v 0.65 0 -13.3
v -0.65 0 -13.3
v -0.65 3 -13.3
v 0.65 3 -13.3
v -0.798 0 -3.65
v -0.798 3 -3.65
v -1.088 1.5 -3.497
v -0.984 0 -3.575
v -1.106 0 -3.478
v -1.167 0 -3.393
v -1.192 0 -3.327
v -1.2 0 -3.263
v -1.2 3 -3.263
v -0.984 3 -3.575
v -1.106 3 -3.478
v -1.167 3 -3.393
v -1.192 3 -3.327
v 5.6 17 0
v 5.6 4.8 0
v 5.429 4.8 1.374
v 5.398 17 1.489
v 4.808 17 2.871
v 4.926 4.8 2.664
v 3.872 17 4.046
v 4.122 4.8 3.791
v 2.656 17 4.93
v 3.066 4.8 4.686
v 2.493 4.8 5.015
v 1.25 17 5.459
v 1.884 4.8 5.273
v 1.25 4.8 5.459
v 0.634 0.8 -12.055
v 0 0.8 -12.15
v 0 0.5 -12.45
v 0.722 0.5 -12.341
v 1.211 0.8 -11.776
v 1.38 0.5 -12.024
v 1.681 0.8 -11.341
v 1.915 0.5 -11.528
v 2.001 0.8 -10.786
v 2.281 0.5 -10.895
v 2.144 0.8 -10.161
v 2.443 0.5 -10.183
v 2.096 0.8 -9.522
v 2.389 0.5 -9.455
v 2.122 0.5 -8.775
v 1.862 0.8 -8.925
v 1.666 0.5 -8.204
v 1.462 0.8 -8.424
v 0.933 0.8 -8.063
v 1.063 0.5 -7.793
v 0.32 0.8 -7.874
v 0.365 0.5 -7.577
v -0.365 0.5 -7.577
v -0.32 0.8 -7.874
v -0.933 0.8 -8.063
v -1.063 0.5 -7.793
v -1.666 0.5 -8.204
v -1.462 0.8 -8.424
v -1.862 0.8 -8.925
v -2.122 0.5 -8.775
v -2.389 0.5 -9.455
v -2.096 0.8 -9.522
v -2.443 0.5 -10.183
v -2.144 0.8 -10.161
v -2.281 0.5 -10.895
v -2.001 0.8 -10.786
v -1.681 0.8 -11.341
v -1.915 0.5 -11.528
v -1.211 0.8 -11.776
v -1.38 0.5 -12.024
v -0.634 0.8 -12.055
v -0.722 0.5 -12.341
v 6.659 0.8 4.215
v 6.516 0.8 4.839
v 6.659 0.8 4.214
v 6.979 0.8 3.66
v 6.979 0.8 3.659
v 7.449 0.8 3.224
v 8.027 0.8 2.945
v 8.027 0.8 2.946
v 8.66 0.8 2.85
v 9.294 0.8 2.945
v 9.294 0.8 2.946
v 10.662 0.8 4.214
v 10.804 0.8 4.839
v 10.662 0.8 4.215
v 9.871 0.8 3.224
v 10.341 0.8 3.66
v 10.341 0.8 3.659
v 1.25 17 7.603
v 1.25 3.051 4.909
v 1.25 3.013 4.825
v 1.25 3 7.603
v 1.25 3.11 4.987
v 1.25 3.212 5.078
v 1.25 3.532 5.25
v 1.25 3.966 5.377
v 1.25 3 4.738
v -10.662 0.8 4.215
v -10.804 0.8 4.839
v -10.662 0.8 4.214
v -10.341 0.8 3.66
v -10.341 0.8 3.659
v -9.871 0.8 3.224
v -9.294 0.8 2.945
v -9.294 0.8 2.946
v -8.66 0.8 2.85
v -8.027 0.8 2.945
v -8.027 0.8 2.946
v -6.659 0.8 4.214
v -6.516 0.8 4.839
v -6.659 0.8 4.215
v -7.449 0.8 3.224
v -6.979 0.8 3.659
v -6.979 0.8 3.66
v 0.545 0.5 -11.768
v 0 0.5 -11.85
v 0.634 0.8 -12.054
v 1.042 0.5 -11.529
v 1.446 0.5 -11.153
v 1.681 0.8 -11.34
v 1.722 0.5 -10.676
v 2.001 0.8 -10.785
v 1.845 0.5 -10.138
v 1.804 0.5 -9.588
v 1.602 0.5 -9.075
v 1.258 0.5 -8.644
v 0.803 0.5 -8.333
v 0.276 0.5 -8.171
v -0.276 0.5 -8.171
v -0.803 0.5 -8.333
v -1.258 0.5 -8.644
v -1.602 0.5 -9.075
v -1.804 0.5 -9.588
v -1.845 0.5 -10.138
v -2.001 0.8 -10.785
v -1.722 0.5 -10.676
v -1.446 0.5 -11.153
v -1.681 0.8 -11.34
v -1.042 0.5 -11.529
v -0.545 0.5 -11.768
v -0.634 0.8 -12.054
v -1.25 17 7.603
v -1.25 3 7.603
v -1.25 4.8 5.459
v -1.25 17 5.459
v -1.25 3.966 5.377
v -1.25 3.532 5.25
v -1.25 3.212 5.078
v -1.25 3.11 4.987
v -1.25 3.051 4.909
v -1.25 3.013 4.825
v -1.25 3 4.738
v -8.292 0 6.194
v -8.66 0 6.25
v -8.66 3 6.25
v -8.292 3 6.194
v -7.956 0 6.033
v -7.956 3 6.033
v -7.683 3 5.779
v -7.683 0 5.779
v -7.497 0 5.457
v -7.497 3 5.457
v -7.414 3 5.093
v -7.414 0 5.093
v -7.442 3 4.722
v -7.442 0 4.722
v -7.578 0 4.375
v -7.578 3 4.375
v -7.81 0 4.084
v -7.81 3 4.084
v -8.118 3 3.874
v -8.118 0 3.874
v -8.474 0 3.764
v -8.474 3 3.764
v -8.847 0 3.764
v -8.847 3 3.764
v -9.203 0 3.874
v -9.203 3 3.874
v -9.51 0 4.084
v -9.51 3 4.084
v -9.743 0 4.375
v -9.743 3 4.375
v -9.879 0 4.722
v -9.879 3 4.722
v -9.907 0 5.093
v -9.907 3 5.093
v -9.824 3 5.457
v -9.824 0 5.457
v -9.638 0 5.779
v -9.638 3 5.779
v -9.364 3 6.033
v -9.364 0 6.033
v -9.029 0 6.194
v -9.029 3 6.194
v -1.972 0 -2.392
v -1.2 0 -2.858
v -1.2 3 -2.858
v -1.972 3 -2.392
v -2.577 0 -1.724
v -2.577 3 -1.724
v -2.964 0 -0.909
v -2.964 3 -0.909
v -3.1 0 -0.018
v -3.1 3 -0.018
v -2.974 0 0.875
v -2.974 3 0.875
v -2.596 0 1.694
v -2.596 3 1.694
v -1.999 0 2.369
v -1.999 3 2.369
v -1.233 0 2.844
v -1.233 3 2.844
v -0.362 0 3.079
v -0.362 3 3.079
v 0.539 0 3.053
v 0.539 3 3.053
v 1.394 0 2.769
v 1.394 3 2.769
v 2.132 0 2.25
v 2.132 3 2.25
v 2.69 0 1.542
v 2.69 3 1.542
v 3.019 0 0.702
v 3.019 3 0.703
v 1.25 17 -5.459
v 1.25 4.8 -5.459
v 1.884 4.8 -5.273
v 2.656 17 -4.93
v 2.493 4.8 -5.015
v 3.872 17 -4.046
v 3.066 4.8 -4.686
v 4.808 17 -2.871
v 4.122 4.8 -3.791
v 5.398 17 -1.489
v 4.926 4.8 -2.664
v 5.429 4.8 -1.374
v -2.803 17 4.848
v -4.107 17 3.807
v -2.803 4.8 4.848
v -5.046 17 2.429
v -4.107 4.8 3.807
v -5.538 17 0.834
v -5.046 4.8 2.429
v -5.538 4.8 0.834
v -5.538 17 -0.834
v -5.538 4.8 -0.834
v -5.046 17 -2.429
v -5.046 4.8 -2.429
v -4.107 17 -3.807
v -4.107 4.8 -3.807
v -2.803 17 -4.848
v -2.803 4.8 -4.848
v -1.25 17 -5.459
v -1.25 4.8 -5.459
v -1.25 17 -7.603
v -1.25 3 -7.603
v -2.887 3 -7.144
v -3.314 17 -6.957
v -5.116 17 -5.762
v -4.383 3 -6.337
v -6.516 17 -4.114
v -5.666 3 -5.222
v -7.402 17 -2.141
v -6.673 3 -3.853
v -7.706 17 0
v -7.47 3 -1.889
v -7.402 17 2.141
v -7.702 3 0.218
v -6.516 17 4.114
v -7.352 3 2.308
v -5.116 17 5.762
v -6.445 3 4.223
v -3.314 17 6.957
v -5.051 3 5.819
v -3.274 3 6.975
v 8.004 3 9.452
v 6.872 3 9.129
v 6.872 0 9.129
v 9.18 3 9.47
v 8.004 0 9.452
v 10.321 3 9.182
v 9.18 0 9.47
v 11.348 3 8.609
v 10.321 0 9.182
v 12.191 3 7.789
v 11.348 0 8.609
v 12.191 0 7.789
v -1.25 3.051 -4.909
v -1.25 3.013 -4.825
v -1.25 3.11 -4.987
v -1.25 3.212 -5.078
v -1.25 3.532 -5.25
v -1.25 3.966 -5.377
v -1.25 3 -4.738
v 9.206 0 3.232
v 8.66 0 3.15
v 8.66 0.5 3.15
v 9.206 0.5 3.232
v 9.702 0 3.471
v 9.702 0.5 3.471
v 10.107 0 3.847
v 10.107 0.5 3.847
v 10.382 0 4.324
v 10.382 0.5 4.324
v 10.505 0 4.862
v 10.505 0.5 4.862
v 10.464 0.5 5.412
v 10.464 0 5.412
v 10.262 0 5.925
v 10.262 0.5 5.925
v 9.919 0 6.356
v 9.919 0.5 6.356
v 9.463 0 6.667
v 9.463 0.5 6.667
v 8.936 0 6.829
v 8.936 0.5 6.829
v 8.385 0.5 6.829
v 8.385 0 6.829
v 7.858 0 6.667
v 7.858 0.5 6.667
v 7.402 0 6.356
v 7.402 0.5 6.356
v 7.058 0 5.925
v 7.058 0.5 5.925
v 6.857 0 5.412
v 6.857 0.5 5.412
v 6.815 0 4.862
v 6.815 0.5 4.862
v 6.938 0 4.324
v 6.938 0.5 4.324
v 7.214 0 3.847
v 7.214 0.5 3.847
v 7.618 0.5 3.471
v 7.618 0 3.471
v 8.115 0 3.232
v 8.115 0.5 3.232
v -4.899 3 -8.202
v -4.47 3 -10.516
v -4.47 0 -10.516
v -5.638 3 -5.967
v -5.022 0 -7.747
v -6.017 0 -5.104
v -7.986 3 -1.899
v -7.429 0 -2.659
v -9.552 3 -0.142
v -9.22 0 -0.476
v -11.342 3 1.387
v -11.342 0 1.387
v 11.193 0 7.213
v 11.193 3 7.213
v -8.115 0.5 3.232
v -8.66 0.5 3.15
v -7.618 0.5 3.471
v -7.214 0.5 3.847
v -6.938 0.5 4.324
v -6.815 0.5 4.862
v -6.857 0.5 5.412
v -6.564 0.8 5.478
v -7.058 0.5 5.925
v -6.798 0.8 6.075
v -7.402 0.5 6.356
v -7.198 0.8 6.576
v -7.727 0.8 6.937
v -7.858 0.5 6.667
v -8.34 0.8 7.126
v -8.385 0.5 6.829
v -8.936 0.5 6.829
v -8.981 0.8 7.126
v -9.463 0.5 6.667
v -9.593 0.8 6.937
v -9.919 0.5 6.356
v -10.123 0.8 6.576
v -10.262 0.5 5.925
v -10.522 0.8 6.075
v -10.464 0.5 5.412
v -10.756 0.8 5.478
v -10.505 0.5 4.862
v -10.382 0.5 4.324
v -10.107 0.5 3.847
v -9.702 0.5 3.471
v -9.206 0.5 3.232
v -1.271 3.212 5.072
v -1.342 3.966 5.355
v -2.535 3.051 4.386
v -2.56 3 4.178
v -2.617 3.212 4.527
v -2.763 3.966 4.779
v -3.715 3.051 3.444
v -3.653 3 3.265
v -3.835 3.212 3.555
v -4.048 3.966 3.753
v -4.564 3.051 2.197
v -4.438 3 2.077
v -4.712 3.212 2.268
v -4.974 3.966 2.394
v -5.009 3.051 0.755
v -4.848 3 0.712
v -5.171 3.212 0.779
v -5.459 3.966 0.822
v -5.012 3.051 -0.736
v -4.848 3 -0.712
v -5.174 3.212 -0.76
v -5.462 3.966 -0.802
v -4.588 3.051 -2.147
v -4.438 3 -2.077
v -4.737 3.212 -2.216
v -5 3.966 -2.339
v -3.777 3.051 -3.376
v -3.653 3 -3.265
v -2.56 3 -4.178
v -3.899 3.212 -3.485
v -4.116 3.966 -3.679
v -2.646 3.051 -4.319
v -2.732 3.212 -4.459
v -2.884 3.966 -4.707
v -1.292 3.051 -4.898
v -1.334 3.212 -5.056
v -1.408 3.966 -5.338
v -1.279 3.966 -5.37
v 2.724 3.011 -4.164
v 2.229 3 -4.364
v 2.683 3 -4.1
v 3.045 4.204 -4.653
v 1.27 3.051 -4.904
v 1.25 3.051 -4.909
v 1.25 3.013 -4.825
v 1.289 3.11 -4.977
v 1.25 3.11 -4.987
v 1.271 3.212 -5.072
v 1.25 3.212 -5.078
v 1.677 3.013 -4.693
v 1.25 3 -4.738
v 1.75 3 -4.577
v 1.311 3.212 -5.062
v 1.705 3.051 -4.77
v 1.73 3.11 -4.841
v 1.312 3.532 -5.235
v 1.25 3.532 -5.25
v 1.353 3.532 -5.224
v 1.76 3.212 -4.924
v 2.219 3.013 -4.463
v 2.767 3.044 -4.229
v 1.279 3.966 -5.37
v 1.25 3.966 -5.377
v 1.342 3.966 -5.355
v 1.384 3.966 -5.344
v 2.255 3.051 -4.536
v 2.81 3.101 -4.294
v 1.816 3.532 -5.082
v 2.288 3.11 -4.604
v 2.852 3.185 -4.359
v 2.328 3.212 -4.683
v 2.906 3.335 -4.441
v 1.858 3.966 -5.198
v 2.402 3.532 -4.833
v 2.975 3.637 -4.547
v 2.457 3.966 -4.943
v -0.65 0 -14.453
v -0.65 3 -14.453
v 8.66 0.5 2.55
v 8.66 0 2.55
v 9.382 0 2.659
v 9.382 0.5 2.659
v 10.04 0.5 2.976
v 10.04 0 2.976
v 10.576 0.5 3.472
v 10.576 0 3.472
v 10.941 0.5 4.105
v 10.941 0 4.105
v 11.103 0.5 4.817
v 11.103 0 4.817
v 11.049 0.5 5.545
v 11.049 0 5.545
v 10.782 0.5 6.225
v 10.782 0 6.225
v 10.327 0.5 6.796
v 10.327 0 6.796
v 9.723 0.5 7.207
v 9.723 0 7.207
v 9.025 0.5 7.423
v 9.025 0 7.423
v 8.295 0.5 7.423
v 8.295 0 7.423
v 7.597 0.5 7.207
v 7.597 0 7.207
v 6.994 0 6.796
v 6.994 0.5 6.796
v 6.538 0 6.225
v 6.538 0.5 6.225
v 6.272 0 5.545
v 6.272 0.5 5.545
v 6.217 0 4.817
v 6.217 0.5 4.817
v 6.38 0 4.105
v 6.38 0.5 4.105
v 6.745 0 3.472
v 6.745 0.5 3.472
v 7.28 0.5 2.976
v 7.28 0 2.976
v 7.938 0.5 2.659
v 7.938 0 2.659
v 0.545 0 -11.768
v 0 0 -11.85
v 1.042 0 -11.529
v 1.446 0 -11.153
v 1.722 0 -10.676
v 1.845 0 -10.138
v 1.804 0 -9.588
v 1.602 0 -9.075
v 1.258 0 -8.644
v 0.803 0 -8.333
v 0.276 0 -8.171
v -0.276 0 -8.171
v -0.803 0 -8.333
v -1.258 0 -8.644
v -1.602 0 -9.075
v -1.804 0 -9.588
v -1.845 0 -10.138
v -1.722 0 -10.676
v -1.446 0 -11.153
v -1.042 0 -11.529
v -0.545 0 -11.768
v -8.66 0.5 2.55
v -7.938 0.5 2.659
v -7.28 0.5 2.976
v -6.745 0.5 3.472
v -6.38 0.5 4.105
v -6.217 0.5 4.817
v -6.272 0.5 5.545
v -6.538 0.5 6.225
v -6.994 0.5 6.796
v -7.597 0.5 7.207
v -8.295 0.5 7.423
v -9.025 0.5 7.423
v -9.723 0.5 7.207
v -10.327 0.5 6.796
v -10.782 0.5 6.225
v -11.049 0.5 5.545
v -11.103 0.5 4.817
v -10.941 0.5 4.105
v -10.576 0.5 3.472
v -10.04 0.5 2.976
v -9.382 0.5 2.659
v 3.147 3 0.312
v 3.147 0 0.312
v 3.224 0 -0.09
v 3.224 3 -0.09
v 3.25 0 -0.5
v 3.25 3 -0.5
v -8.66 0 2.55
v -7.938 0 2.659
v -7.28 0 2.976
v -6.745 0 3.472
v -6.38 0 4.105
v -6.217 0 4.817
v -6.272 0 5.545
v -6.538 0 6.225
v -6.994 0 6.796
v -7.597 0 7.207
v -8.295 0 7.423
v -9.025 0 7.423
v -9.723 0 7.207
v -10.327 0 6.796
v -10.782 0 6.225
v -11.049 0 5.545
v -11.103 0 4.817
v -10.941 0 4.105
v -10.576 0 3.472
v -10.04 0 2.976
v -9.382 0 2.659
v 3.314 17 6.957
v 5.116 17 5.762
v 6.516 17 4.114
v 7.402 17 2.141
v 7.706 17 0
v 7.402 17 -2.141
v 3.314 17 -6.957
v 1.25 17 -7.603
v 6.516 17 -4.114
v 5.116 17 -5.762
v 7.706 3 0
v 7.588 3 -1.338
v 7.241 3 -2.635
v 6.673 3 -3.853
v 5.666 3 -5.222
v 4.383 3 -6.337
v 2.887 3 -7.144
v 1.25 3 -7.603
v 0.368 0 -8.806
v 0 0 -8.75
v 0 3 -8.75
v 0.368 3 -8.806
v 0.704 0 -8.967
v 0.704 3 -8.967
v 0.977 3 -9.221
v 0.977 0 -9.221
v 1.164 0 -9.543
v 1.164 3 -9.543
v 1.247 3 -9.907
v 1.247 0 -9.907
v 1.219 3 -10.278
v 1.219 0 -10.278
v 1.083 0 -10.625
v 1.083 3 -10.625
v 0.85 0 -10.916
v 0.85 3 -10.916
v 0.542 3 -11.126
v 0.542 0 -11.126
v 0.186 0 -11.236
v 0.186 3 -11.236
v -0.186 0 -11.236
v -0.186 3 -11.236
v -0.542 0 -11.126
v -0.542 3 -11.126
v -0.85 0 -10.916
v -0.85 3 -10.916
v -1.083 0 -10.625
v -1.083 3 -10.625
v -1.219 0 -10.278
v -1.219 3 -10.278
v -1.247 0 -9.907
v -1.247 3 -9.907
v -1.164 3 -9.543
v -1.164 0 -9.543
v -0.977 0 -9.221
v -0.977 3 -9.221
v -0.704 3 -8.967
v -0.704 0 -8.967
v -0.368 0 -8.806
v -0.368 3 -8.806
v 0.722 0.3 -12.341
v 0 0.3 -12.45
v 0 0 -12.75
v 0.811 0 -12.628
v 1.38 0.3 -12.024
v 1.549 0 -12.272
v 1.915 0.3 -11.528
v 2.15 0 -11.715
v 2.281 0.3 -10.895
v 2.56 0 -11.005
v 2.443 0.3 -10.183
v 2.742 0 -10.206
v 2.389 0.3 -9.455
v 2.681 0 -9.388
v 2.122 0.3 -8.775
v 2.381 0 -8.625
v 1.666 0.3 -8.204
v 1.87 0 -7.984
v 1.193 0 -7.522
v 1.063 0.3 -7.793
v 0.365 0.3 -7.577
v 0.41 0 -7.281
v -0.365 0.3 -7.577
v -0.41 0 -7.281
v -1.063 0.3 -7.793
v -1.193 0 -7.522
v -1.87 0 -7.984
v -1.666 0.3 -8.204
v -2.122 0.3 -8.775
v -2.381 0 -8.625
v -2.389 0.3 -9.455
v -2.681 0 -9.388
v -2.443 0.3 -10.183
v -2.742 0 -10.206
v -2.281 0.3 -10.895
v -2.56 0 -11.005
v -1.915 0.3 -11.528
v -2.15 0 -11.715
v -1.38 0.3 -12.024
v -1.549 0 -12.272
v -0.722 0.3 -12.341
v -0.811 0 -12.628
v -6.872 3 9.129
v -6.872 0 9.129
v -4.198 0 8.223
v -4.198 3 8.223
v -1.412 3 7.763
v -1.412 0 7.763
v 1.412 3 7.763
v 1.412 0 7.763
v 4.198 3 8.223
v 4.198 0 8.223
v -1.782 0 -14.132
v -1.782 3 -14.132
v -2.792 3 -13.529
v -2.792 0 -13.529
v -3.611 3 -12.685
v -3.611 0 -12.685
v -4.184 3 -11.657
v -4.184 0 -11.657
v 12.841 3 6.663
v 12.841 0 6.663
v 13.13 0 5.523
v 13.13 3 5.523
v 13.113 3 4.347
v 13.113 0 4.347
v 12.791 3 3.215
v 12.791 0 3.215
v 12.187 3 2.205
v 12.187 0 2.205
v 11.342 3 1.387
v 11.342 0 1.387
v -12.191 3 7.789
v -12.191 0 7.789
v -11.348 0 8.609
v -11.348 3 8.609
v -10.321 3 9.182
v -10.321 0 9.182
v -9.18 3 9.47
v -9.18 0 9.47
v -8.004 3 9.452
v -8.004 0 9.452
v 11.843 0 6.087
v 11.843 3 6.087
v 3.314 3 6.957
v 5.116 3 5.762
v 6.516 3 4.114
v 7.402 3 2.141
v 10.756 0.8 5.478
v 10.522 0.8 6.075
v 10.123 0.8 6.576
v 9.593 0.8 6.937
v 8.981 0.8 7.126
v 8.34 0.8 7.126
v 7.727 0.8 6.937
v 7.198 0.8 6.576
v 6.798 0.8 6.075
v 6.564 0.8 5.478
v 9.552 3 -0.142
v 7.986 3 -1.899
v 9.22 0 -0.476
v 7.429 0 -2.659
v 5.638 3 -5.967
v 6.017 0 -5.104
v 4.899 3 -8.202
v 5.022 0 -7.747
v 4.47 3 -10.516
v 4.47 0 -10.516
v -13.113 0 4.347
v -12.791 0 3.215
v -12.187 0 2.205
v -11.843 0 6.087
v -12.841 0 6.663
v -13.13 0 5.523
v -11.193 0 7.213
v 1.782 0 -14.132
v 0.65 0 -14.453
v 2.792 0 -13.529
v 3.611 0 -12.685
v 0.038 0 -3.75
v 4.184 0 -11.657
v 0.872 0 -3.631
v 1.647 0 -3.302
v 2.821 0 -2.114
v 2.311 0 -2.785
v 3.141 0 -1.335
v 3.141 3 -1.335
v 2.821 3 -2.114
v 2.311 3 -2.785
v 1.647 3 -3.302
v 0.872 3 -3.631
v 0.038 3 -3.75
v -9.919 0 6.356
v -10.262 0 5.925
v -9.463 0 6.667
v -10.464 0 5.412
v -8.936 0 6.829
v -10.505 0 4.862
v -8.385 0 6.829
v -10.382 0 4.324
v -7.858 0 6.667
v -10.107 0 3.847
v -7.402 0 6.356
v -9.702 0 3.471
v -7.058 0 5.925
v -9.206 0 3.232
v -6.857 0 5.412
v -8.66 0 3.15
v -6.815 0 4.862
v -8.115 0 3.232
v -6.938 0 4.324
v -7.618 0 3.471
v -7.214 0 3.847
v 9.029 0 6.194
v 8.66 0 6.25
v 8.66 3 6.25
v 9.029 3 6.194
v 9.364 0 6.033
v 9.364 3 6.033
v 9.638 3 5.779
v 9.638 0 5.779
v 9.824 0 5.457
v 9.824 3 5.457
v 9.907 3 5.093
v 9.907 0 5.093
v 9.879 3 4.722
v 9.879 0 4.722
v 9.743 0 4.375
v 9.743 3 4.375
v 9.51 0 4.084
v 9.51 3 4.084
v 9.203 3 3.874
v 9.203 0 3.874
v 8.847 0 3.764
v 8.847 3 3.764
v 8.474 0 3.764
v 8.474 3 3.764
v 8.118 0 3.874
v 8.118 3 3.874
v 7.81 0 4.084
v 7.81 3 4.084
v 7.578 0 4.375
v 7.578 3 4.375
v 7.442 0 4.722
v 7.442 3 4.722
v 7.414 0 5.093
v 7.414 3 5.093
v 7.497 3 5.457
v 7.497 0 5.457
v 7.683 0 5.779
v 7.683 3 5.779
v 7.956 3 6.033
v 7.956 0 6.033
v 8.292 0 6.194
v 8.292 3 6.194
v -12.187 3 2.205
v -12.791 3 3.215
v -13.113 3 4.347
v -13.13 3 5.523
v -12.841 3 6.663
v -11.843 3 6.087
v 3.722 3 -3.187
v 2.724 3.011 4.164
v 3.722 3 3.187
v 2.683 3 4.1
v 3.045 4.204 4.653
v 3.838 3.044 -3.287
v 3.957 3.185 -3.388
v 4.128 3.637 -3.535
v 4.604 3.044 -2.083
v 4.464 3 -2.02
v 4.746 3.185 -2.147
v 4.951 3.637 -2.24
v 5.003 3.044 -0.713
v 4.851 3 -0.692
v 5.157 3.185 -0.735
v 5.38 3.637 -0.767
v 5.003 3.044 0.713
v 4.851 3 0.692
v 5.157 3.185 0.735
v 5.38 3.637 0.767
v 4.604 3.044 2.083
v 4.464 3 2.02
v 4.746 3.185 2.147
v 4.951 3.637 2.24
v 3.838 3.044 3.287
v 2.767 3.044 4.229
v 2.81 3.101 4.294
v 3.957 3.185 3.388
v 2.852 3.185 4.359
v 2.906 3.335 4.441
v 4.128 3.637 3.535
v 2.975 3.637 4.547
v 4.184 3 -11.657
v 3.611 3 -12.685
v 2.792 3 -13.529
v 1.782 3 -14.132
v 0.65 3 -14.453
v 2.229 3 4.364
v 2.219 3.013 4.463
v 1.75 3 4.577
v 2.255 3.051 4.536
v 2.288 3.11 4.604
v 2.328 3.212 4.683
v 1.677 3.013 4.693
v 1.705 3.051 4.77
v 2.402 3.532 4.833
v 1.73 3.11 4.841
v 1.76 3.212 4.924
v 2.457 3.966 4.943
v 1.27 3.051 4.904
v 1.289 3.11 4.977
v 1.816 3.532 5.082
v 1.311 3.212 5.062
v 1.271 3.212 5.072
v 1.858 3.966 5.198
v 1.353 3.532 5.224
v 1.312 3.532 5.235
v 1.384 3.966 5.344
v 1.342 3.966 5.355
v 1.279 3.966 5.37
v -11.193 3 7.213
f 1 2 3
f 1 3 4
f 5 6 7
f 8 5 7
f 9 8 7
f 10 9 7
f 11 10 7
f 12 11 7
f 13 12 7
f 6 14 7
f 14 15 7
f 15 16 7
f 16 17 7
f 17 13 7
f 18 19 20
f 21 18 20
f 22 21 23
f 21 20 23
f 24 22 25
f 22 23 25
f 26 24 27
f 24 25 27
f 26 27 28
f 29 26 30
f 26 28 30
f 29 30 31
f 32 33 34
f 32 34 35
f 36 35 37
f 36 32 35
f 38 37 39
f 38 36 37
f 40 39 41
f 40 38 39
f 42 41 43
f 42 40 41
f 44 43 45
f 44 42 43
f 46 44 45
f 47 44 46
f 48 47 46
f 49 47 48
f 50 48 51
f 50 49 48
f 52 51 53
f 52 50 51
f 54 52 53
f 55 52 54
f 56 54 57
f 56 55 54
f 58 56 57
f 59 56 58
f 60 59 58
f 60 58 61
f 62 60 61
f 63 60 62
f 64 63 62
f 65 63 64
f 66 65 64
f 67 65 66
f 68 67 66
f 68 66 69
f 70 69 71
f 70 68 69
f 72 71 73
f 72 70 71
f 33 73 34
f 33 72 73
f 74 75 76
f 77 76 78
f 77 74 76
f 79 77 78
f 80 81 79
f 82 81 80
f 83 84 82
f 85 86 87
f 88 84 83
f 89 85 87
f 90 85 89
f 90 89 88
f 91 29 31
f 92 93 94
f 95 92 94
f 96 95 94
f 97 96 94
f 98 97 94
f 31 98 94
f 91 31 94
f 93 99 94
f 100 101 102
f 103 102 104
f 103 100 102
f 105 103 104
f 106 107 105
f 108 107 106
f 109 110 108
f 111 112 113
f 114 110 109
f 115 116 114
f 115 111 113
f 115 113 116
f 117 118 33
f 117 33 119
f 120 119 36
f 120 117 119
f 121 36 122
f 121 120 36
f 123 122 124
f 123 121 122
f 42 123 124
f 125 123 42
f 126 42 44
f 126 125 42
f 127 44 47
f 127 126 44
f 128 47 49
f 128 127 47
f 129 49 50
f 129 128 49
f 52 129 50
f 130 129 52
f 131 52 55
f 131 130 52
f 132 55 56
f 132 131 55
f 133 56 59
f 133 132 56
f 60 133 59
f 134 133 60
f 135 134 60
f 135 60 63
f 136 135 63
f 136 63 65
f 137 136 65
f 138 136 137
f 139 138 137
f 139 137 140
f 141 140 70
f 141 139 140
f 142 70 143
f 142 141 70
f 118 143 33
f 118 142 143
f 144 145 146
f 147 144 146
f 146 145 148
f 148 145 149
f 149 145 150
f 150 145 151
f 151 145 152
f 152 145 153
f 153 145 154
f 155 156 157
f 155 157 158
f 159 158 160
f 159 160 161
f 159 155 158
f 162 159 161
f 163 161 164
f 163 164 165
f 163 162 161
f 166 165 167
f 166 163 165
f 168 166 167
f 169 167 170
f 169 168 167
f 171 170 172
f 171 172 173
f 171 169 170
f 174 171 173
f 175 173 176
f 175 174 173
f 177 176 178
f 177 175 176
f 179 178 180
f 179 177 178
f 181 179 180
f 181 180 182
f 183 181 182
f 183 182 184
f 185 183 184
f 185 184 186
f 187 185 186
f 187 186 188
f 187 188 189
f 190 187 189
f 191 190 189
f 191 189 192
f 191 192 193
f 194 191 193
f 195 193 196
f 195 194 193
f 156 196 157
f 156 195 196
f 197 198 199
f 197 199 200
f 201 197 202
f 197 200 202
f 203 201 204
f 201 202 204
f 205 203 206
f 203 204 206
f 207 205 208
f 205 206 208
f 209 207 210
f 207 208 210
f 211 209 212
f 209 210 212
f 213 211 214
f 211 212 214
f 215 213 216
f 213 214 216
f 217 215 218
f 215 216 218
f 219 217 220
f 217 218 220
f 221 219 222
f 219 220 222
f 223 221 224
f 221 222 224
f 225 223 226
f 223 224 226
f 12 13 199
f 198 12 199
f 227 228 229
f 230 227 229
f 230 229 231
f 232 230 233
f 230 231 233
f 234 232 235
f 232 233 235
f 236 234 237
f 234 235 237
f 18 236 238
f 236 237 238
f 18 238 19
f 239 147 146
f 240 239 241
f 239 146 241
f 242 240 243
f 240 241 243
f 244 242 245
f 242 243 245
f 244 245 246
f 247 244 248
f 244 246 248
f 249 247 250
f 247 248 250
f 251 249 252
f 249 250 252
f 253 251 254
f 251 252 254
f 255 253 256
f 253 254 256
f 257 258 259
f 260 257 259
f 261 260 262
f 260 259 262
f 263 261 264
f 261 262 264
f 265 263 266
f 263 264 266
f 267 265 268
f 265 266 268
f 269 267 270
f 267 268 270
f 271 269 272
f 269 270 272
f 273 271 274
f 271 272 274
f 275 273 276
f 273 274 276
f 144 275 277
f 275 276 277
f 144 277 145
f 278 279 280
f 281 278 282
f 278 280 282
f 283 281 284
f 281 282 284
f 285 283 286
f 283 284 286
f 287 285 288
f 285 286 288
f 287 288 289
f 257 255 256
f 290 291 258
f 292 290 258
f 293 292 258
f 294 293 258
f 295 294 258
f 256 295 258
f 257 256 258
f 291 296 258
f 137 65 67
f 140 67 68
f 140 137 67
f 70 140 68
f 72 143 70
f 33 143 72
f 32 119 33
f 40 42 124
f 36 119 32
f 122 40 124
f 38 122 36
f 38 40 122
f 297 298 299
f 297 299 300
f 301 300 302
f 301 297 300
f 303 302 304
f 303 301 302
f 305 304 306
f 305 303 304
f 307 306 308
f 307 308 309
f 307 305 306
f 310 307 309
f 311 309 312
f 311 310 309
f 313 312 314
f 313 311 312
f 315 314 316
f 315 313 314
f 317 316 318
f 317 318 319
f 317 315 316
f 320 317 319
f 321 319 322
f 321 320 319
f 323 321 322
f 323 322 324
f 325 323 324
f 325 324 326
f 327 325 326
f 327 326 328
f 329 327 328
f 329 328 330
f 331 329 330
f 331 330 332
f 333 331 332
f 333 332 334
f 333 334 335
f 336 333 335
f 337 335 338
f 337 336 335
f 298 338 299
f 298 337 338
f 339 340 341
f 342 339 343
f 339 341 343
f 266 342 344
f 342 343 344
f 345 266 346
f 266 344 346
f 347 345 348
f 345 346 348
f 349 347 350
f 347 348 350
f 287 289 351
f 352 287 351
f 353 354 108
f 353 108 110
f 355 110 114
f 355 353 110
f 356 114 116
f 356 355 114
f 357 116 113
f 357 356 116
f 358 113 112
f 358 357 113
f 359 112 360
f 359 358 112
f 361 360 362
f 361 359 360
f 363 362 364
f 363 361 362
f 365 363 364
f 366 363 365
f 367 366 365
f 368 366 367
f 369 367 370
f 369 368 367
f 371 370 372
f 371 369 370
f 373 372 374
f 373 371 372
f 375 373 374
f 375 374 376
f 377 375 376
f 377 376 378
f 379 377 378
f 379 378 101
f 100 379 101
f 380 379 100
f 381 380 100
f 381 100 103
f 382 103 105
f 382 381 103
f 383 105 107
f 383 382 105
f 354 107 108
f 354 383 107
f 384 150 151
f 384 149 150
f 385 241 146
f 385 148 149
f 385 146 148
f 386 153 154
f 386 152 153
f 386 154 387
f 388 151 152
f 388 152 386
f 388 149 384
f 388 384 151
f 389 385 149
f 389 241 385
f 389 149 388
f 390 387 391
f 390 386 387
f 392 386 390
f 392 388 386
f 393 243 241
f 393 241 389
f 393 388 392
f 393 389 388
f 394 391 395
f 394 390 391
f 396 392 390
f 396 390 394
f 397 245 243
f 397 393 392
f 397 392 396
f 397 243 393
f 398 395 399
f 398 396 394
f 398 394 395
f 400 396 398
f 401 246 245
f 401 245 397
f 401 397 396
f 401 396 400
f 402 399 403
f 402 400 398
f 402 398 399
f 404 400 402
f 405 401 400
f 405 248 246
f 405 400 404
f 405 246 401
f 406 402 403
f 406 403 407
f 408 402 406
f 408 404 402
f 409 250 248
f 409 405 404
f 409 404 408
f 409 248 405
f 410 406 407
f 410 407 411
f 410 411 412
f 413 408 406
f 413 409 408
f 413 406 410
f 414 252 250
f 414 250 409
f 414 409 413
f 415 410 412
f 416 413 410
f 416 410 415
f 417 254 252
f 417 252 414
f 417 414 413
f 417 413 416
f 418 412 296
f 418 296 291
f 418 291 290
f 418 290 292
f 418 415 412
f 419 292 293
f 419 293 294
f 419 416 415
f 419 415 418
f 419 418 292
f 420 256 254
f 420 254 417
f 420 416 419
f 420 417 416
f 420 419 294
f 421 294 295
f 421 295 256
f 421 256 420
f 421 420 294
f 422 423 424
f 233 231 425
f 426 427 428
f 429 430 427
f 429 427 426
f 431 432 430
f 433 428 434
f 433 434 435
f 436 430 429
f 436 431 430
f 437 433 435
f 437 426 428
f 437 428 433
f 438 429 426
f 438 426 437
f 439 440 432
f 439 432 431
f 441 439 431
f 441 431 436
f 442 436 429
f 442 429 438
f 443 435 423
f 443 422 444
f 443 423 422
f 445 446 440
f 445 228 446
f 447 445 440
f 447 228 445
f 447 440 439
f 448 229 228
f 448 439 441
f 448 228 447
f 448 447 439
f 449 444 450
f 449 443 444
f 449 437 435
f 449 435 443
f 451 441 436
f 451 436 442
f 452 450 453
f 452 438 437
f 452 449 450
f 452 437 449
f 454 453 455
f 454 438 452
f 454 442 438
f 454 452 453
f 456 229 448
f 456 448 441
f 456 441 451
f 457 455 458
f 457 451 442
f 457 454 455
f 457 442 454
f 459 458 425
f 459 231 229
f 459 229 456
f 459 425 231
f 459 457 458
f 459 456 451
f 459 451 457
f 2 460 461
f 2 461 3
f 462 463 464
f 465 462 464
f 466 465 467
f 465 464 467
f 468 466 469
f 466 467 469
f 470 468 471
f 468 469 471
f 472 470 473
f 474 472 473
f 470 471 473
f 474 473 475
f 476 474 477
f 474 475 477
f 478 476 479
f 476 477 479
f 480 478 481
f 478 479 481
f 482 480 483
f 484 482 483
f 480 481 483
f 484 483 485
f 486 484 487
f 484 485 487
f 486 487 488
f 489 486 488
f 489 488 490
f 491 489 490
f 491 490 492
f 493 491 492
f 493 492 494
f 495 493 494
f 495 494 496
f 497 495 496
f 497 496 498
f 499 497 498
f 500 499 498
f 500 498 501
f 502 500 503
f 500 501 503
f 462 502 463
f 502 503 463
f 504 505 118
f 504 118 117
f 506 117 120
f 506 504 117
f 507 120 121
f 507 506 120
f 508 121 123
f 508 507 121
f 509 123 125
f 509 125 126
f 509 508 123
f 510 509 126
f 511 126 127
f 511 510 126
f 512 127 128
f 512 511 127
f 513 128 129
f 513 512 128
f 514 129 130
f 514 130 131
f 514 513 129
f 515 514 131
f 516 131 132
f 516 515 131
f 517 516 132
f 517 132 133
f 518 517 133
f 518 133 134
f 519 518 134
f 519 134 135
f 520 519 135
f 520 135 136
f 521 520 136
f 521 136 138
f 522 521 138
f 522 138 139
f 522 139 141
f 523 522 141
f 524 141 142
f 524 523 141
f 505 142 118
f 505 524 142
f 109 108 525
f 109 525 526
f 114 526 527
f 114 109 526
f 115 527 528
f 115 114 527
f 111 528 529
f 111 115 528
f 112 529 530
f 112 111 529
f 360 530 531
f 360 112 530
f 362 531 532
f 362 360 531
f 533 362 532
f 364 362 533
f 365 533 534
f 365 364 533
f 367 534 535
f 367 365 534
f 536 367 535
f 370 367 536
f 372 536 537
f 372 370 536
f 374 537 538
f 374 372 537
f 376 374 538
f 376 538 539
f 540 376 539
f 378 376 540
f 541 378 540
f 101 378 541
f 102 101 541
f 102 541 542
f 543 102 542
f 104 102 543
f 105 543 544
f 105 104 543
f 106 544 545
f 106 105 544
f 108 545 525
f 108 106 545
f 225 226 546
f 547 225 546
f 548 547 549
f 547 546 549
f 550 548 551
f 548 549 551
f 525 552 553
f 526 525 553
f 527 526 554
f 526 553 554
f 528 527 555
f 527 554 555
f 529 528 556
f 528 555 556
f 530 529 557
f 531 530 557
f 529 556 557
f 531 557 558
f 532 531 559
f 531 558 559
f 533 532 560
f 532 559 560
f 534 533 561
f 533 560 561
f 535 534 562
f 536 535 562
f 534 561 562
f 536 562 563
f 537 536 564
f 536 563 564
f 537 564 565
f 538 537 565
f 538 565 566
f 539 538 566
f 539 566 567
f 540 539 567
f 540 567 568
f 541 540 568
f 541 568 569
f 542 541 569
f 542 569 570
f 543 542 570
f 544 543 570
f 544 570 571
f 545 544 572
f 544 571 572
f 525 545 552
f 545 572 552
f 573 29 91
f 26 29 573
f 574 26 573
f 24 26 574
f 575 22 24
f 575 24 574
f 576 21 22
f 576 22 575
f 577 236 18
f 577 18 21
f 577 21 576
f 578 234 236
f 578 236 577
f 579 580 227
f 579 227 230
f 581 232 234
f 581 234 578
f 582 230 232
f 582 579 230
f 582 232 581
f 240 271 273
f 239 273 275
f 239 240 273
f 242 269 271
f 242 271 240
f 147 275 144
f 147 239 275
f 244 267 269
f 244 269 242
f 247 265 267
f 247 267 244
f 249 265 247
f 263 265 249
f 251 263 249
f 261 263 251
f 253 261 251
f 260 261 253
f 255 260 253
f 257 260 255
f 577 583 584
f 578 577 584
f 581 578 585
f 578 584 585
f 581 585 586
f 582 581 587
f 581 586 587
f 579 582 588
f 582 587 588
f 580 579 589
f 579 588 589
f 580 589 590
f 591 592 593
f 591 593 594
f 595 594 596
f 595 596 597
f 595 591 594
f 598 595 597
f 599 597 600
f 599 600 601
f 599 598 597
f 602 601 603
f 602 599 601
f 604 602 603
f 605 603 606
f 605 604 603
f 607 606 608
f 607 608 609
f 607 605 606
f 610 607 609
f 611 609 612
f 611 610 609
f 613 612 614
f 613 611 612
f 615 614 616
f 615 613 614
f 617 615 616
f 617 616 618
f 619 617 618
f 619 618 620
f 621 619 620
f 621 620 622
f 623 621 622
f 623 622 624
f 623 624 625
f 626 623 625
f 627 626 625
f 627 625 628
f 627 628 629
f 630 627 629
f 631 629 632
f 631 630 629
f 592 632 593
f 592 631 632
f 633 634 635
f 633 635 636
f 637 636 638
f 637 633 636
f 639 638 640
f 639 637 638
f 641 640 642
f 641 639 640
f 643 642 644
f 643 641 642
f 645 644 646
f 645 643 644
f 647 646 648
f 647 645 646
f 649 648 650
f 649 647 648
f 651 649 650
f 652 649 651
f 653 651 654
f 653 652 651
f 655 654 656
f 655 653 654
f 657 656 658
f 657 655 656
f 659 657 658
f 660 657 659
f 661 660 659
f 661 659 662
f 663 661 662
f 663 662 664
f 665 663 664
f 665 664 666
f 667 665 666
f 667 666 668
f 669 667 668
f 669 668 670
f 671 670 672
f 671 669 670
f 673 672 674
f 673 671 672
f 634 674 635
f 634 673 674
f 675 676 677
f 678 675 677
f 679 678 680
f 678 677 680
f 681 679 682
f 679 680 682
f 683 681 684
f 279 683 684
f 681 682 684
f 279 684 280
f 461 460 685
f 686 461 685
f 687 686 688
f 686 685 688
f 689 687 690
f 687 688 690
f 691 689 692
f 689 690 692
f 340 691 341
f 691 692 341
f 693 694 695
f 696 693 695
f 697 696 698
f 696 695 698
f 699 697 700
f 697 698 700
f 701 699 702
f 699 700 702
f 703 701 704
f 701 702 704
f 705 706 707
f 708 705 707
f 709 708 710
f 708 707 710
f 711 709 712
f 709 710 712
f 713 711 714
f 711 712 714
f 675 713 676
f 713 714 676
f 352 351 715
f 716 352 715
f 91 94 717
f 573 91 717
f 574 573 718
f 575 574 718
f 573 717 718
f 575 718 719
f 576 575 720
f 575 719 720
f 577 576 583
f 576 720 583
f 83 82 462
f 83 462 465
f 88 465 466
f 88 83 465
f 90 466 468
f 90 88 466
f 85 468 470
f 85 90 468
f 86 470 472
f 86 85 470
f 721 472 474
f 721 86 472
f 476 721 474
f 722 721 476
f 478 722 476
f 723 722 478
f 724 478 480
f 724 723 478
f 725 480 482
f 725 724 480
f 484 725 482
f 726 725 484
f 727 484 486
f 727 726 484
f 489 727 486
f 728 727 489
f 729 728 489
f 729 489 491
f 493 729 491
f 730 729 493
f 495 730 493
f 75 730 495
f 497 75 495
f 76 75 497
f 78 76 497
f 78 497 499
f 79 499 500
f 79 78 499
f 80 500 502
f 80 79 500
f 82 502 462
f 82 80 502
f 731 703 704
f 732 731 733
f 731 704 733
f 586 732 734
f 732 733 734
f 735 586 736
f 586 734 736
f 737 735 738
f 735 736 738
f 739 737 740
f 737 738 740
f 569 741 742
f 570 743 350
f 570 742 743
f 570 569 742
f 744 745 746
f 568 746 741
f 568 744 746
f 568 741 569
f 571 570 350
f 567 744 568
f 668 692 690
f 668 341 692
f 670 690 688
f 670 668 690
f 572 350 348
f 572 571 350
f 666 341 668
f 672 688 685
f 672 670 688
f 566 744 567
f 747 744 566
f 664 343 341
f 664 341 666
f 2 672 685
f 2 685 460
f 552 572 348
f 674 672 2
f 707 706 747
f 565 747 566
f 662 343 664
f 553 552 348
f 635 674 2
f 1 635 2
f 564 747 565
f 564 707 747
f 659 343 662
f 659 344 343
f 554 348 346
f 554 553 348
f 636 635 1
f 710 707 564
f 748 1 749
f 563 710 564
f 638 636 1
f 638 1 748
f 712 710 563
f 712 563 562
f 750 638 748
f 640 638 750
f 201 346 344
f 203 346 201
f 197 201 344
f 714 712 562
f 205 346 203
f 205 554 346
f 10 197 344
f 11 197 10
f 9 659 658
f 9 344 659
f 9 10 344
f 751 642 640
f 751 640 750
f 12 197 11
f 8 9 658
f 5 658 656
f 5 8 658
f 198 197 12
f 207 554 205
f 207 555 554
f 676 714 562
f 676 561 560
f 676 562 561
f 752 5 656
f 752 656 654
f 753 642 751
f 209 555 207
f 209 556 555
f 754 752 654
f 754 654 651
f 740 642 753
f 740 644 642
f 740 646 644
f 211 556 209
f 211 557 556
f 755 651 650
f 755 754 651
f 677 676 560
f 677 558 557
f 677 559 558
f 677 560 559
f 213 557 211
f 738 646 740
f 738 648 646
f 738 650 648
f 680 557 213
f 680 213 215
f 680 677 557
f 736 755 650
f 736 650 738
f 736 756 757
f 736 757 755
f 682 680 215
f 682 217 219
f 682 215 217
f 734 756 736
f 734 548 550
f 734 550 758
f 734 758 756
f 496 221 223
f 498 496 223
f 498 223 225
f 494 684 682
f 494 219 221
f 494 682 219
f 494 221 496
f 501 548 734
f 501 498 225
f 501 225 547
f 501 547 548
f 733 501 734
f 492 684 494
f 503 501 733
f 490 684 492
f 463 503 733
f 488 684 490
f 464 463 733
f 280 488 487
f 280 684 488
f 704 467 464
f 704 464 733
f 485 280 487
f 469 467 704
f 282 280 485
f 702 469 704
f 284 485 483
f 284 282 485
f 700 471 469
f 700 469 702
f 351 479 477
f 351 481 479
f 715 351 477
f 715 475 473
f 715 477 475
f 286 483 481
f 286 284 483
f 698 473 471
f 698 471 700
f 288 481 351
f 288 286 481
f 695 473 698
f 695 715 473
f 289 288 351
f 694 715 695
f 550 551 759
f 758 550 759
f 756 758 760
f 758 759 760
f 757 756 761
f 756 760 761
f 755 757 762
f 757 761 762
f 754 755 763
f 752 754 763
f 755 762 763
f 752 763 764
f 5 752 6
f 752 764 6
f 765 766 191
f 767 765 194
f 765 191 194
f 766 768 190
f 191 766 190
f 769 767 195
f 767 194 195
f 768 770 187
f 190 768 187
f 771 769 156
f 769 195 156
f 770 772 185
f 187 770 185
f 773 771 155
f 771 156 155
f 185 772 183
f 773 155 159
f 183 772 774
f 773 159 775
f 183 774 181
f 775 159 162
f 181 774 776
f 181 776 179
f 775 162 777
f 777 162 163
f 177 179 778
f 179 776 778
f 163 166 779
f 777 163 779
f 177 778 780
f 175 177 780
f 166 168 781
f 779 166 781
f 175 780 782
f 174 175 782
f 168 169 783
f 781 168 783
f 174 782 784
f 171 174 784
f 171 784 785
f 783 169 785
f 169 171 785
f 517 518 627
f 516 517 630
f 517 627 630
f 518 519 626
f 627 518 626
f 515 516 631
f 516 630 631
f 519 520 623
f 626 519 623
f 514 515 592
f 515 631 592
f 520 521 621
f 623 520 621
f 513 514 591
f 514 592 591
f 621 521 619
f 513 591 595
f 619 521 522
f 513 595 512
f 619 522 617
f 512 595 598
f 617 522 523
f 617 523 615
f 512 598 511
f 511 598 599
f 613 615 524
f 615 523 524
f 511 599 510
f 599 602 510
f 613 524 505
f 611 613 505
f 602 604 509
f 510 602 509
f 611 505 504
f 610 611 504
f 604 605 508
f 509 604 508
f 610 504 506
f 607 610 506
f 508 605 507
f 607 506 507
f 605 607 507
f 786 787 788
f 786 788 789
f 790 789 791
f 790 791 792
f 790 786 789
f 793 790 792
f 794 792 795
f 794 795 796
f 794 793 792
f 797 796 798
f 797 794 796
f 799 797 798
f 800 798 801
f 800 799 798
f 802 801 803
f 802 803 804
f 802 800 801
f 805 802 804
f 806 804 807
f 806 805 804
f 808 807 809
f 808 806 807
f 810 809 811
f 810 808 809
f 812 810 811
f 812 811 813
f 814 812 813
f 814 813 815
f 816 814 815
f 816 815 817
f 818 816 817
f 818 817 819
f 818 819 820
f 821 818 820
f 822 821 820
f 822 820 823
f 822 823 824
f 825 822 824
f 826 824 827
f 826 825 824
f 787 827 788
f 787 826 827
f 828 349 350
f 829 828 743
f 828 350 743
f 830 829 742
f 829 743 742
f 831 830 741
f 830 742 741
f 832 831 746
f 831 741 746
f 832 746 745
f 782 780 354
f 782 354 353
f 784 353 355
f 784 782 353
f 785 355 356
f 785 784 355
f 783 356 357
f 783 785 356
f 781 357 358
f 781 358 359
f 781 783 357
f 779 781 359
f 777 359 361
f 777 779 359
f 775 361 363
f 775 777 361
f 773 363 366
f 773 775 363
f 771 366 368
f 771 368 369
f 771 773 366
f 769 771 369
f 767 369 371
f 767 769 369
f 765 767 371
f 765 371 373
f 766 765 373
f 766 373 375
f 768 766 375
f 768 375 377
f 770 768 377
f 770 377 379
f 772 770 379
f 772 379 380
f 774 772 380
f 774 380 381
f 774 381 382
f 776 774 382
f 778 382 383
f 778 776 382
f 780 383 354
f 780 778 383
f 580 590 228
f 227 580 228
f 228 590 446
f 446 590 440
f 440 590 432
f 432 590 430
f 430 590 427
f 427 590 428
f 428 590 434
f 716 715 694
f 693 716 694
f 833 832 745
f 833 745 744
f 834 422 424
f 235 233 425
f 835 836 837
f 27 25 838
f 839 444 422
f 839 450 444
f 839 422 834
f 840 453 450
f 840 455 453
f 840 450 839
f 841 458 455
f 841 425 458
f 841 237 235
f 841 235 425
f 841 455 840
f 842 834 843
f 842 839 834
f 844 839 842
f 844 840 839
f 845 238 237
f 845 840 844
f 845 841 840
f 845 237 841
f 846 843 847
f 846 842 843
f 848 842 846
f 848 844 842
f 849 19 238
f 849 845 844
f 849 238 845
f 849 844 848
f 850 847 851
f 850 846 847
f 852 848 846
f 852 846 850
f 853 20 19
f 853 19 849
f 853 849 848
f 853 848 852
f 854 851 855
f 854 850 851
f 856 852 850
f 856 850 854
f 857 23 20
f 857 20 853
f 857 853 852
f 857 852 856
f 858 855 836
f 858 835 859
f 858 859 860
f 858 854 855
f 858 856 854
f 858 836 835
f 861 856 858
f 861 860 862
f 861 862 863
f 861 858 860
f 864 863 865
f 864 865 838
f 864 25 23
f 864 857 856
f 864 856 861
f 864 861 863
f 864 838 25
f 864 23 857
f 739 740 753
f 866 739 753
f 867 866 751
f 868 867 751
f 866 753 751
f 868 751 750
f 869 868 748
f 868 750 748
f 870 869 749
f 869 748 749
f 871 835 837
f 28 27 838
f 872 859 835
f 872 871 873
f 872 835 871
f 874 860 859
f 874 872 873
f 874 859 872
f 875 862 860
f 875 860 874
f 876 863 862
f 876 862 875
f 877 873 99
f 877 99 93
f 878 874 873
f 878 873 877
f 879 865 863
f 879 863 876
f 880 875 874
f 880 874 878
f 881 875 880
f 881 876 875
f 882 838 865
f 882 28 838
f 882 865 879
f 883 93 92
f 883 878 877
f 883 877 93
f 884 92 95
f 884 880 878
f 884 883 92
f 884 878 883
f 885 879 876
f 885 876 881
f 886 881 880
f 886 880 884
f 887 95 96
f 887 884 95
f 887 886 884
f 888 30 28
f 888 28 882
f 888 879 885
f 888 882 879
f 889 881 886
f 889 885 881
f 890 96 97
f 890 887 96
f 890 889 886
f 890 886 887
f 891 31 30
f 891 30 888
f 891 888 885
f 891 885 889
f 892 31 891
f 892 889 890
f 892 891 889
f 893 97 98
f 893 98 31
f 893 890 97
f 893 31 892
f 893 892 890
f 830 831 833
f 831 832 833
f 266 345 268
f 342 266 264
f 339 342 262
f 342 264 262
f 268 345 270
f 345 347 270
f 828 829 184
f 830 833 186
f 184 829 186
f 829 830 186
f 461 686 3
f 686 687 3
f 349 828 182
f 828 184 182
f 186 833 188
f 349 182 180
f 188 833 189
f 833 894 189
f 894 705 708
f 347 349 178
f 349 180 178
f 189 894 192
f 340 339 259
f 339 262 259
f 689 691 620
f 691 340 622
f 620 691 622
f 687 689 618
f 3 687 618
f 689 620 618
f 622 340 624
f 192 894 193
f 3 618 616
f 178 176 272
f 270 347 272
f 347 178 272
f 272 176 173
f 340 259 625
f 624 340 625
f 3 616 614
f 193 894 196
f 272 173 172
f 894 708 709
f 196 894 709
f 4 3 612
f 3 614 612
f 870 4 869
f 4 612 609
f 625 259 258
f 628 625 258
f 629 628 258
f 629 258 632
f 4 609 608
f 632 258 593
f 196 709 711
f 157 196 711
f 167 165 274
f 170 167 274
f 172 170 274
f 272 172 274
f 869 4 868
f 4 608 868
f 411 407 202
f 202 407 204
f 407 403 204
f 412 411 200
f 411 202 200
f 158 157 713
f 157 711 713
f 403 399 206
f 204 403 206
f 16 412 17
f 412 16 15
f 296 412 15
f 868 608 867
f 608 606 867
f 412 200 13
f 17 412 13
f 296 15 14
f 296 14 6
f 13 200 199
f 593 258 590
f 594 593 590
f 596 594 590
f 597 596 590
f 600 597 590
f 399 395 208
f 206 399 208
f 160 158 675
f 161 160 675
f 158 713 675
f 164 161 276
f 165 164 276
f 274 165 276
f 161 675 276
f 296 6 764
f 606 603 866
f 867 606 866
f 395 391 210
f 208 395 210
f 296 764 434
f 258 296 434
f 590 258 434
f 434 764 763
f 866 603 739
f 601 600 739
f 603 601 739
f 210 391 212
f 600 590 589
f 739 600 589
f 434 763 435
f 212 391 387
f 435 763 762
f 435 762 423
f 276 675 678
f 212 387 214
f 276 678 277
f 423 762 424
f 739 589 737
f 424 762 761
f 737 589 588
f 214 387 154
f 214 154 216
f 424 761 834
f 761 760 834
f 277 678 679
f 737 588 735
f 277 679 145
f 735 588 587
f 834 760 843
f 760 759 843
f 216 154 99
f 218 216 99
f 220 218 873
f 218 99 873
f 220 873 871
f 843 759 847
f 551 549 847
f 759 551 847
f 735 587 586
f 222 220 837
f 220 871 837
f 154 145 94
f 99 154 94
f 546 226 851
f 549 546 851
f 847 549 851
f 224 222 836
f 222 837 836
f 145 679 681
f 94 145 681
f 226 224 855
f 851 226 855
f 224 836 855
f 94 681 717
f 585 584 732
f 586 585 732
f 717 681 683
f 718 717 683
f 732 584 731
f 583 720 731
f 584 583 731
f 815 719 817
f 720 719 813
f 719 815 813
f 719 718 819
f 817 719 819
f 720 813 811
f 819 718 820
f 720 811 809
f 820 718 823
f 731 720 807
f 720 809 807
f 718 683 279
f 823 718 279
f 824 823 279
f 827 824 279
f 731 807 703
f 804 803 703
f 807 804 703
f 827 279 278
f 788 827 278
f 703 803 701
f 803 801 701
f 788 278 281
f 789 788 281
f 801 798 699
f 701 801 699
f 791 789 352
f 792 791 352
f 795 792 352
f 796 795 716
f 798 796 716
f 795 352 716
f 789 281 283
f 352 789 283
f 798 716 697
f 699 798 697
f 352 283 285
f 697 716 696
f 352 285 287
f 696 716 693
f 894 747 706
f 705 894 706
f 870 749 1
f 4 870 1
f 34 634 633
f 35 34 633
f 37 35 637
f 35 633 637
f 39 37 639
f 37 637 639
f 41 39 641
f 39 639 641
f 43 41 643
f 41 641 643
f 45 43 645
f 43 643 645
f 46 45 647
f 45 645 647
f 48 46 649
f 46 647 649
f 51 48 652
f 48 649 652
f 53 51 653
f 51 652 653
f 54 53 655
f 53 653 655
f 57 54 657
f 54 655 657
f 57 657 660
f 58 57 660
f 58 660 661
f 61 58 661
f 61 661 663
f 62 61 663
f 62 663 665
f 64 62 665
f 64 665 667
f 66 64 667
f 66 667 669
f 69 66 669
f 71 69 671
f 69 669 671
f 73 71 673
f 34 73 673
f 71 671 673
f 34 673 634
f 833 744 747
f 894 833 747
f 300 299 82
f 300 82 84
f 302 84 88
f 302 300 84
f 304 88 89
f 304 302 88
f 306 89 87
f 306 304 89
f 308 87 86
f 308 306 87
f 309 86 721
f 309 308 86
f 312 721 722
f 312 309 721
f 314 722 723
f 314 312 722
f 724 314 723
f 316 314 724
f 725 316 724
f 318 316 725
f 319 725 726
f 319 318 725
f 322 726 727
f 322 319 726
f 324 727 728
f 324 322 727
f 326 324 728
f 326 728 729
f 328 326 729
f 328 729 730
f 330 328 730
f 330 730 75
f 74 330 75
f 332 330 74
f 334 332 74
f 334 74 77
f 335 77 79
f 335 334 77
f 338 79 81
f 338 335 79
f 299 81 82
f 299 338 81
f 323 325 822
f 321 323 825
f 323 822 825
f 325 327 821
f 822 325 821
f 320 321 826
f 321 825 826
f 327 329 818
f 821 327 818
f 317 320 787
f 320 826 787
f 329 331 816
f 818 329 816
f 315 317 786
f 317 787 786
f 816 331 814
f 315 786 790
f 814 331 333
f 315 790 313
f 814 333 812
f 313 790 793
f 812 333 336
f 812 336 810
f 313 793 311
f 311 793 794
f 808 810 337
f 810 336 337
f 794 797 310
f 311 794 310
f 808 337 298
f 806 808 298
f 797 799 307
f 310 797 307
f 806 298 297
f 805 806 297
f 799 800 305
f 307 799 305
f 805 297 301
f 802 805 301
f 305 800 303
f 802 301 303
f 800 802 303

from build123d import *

# Parameters (mm, degrees)
SKETCH1_R           = 1.25
BOSS_EXTRUDE1_DEPTH = 3
SKETCH8_R           = 2.45
SKETCH8_R_2         = 1.85
CUT_EXTRUDE3_DEPTH  = 0.8
CHAMFER4_SIZE       = 0.3
SKETCH9_R           = 3.1
CUT_EXTRUDE4_DEPTH  = 20.810156141
BOSS_EXTRUDE2_DEPTH = 14
CUT_EXTRUDE5_REACH  = 27.931
SKETCH11_W          = 1.3
SKETCH11_H          = 2.4
FILLET1_SIZE        = 0.7
FILLET1_SIZE_2      = 1.8
CUT_EXTRUDE6_REACH  = 26.043


# Some blends are built 0.0001 mm under size
with BuildPart() as part:
    # Sketch1 → Boss-Extrude1 (new body)
    with BuildSketch(Plane(origin=(0, 0, 0), x_dir=(1, 0, 0), z_dir=(0, 1, 0))):
        with BuildLine():
            ThreePointArc((4.470296705, 10.516185401), (0, 14.5), (-4.470296705, 10.516185401))
            ThreePointArc((-4.470296705, 10.516185401), (-6.673163323, 3.852752641), (-11.342432061, -1.386702192))
            ThreePointArc((-11.342432061, -1.386702192), (-12.557368355, -7.25), (-6.872135356, -9.12948321))
            ThreePointArc((-6.872135356, -9.12948321), (0, -7.705505282), (6.872135356, -9.12948321))
            ThreePointArc((6.872135356, -9.12948321), (12.557368355, -7.25), (11.342432061, -1.386702192))
            ThreePointArc((11.342432061, -1.386702192), (6.673163323, 3.852752641), (4.470296705, 10.516185401))
        make_face()
        with Locations(Location((0, 10, 0), (0, 0, 270))):
            Circle(SKETCH1_R, mode=Mode.SUBTRACT)
        with Locations(Location((-8.660254038, -5, 0), (0, 0, 270))):
            Circle(SKETCH1_R, mode=Mode.SUBTRACT)
        with Locations(Location((8.660254038, -5, 0), (0, 0, 270))):
            Circle(SKETCH1_R, mode=Mode.SUBTRACT)
    extrude(amount=BOSS_EXTRUDE1_DEPTH)

    # Sketch8 → Cut-Extrude3 (cut)
    # profile 1 of 3: a face of its own
    with BuildSketch(Plane.XZ):
        with Locations(Location((8.660254038, 5, 0), (0, 0, 270))):
            Circle(SKETCH8_R)
        with Locations(Location((8.660254038, 5, 0), (0, 0, 270))):
            Circle(SKETCH8_R_2, mode=Mode.SUBTRACT)
    # profile 2 of 3: a face of its own
    with BuildSketch(Plane.XZ):
        with Locations(Location((-8.660254038, 5, 0), (0, 0, 270))):
            Circle(SKETCH8_R)
        with Locations(Location((-8.660254038, 5, 0), (0, 0, 270))):
            Circle(SKETCH8_R_2, mode=Mode.SUBTRACT)
    # profile 3 of 3: a face of its own
    with BuildSketch(Plane.XZ):
        with Locations(Location((0, -10, 0), (0, 0, 270))):
            Circle(SKETCH8_R)
        with Locations(Location((0, -10, 0), (0, 0, 270))):
            Circle(SKETCH8_R_2, mode=Mode.SUBTRACT)
    extrude(amount=-CUT_EXTRUDE3_DEPTH, mode=Mode.SUBTRACT)

    # Chamfer4
    chamfer4_edges = [part.edges().sort_by_distance(p)[0] for p in [
        (8.660254038, 0.8, 7.45),
        (8.660254038, 0.8, 6.85),
        (-8.660254038, 0.8, 7.45),
        (-8.660254038, 0.8, 6.85),
        (0, 0.8, -7.55),
        (0, 0.8, -8.15),
        (0, 0, -7.55),
    ]]
    chamfer(chamfer4_edges, length=CHAMFER4_SIZE - 0.0001)  # a hair under: the kernel refuses the full size

    # Sketch9 → Cut-Extrude4 (cut, through all)
    with BuildSketch(Plane(origin=(0, 3, 0), x_dir=(1, 0, 0), z_dir=(0, 1, 0))):
        with Locations(Location((0, 0, 0), (0, 0, 270))):
            Circle(SKETCH9_R)
    extrude(amount=-CUT_EXTRUDE4_DEPTH, mode=Mode.SUBTRACT)

    # Sketch10 → Boss-Extrude2 (add)
    with BuildSketch(Plane(origin=(0, 3, 0), x_dir=(1, 0, 0), z_dir=(0, 1, 0))):
        with BuildLine():
            ThreePointArc((-1.25, 7.603440777), (-7.705505282, 0), (-1.25, -7.603440777))
            Line((-1.25, -7.603440777), (-1.25, -5.458708638))
            ThreePointArc((-1.25, -5.458708638), (-5.6, 0), (-1.25, 5.458708638))
            Line((-1.25, 5.458708638), (-1.25, 7.603440777))
        make_face()
        with BuildLine():
            Line((1.25, -5.458708638), (1.25, -7.603440777))
            ThreePointArc((1.25, -7.603440777), (5.873954939, -4.987129939), (7.705505282, 0))
            ThreePointArc((7.705505282, 0), (5.873954939, 4.987129939), (1.25, 7.603440777))
            Line((1.25, 7.603440777), (1.25, 5.458708638))
            ThreePointArc((1.25, 5.458708638), (4.379497688, 3.489985673), (5.6, 0))
            ThreePointArc((5.6, 0), (4.379497688, -3.489985673), (1.25, -5.458708638))
        make_face()
    extrude(amount=BOSS_EXTRUDE2_DEPTH)

    # Sketch11 → Cut-Extrude5 (cut, up to next)
    with BuildSketch(Plane.XZ, mode=Mode.PRIVATE) as cut_extrude5_sk1:
        Polygon((13.271598839, 8.412916512), (11.19313787, 7.212916512), (11.84313787, 6.087083488), (13.921598839, 7.287083488), align=None)
    cut_extrude5_tool1 = extrude(cut_extrude5_sk1.sketch, amount=-CUT_EXTRUDE5_REACH, mode=Mode.PRIVATE) & part.part
    # Sketch11 → Cut-Extrude5 (cut, up to next)
    with BuildSketch(Plane.XZ, mode=Mode.PRIVATE) as cut_extrude5_sk2:
        Polygon((-13.921598839, 7.287083488), (-11.84313787, 6.087083488), (-11.19313787, 7.212916512), (-13.271598839, 8.412916512), align=None)
    cut_extrude5_tool2 = extrude(cut_extrude5_sk2.sketch, amount=-CUT_EXTRUDE5_REACH, mode=Mode.PRIVATE) & part.part
    # Sketch11 → Cut-Extrude5 (cut, up to next)
    with BuildSketch(Plane.XZ, mode=Mode.PRIVATE) as cut_extrude5_sk3:
        with Locations((0, -14.5)):
            Rectangle(SKETCH11_W, SKETCH11_H)
    cut_extrude5_tool3 = extrude(cut_extrude5_sk3.sketch, amount=-CUT_EXTRUDE5_REACH, mode=Mode.PRIVATE) & part.part
    add(cut_extrude5_tool1.solids().sort_by_distance((12.557368, 0, 7.25))[0], mode=Mode.SUBTRACT)
    add(cut_extrude5_tool2.solids().sort_by_distance((-12.557368, 0, 7.25))[0], mode=Mode.SUBTRACT)
    add(cut_extrude5_tool3.solids().sort_by_distance((0, 0, -14.5))[0], mode=Mode.SUBTRACT)

    # Fillet1
    # an asymmetric fillet: 1.8, 0.7 mm, written as the material it adds along each edge
    with BuildSketch(Plane(origin=(0, 3, 0), x_dir=(0.5475293805867771, 0, 0.8367864586585159), z_dir=(0.8367864586585159, 0, -0.5475293805867771))) as fillet1_piece_1_section:
        with BuildLine():
            Bezier((5.6 - FILLET1_SIZE, 0), (5.6, 0), (5.6, -FILLET1_SIZE_2), weights=[1, 0.707106781, 1])
            Line((5.6, -FILLET1_SIZE_2), (5.6, 0))
            Line((5.6, 0), (5.6 - FILLET1_SIZE, 0))
        make_face()
    fillet1_piece_1 = revolve(axis=Axis((0, 3, 0), (0, -1, 0)), revolution_arc=246.395365409, mode=Mode.PRIVATE)
    fillet1_piece_1 = split(fillet1_piece_1, bisect_by=Plane(origin=(1.25, 3.4101004, 4.981961309), z_dir=(1, 0, 0)), keep=Keep.TOP, mode=Mode.PRIVATE)
    add(fillet1_piece_1)
    with BuildSketch(Plane(origin=(0, 3, 0), x_dir=(0.5475293805867771, 0, 0.8367864586585159), z_dir=(0.8367864586585159, 0, -0.5475293805867771))) as fillet1_piece_2_section:
        with BuildLine():
            Bezier((5.6 - FILLET1_SIZE, 0), (5.6, 0), (5.6, -FILLET1_SIZE_2), weights=[1, 0.707106781, 1])
            Line((5.6, -FILLET1_SIZE_2), (5.6, 0))
            Line((5.6, 0), (5.6 - FILLET1_SIZE, 0))
        make_face()
    fillet1_piece_2 = revolve(axis=Axis((0, 3, 0), (0, -1, 0)), revolution_arc=246.395365409, mode=Mode.PRIVATE)
    fillet1_piece_2 = split(fillet1_piece_2, bisect_by=Plane(origin=(-1.25, 3.521482182, 0), z_dir=(-1, 0, 0)), keep=Keep.TOP, mode=Mode.PRIVATE)
    add(fillet1_piece_2)
    with BuildSketch(Plane(origin=(0, 3, 0), x_dir=(-0.5475293805867888, 0, -0.8367864586585083), z_dir=(-0.8367864586585083, 0, 0.5475293805867888))) as fillet1_piece_3_section:
        with BuildLine():
            Bezier((5.6 - FILLET1_SIZE, 0), (5.6, 0), (5.6, -FILLET1_SIZE_2), weights=[1, 0.707106781, 1])
            Line((5.6, -FILLET1_SIZE_2), (5.6, 0))
            Line((5.6, 0), (5.6 - FILLET1_SIZE, 0))
        make_face()
    fillet1_piece_3 = revolve(axis=Axis((0, 3, 0), (0, -1, 0)), revolution_arc=246.395365409, mode=Mode.PRIVATE)
    fillet1_piece_3 = split(fillet1_piece_3, bisect_by=Plane(origin=(-1.25, 3.4101004, -4.981961309), z_dir=(-1, 0, 0)), keep=Keep.TOP, mode=Mode.PRIVATE)
    add(fillet1_piece_3)
    with BuildSketch(Plane(origin=(0, 3, 0), x_dir=(-0.5475293805867888, 0, -0.8367864586585083), z_dir=(-0.8367864586585083, 0, 0.5475293805867888))) as fillet1_piece_4_section:
        with BuildLine():
            Bezier((5.6 - FILLET1_SIZE, 0), (5.6, 0), (5.6, -FILLET1_SIZE_2), weights=[1, 0.707106781, 1])
            Line((5.6, -FILLET1_SIZE_2), (5.6, 0))
            Line((5.6, 0), (5.6 - FILLET1_SIZE, 0))
        make_face()
    fillet1_piece_4 = revolve(axis=Axis((0, 3, 0), (0, -1, 0)), revolution_arc=246.395365409, mode=Mode.PRIVATE)
    fillet1_piece_4 = split(fillet1_piece_4, bisect_by=Plane(origin=(1.25, 3.521482182, 0), z_dir=(1, 0, 0)), keep=Keep.TOP, mode=Mode.PRIVATE)
    add(fillet1_piece_4)

    # Sketch13 → Cut-Extrude6 (cut, up to next)
    with BuildSketch(Plane(origin=(0, 3, 0), x_dir=(1, 0, 0), z_dir=(0, 1, 0)), mode=Mode.PRIVATE) as cut_extrude6_sk1:
        with BuildLine():
            Line((-1.2, 3.520347662), (-1.2, 2.858321186))
            ThreePointArc((-1.2, 2.858321186), (1.71610023, 2.581666129), (3.1, 0))
            ThreePointArc((3.1, 0), (3.079772307, -0.353556981), (3.019353201, -0.7025))
            ThreePointArc((3.019353201, -0.7025), (3.1918175, -0.112209971), (3.25, 0.5))
            ThreePointArc((3.25, 0.5), (1.825171225, 3.189098362), (-1.2, 3.520347662))
        make_face()
    cut_extrude6_tool1 = extrude(cut_extrude6_sk1.sketch, amount=-CUT_EXTRUDE6_REACH, mode=Mode.PRIVATE) & part.part
    add(cut_extrude6_tool1.solids().sort_by_distance((1.789819, 3, -3.137012))[0], mode=Mode.SUBTRACT)

    # Fillet2
    # an asymmetric fillet: 0.5, 0.4 mm, written as the material it adds along each edge
    with BuildSketch(Plane(origin=(-1.2, 3, -3.520347662), x_dir=(0.9513626370568626, 0, -0.3080732588398615), z_dir=(0, -1, 0))) as fillet2_piece_1:
        with BuildLine():
            Bezier((0.422293635, 0), (0.008719291, -0.026926088), (-0.079374984, 0.245118303), weights=[1, 0.789181232, 1])
            Line((-0.079374984, 0.245118303), (0, 0))
            ThreePointArc((0, 0), (0.211146817, -0.006866173), (0.422293635, 0))
        make_face()
    extrude(amount=3)


solid = part.part
